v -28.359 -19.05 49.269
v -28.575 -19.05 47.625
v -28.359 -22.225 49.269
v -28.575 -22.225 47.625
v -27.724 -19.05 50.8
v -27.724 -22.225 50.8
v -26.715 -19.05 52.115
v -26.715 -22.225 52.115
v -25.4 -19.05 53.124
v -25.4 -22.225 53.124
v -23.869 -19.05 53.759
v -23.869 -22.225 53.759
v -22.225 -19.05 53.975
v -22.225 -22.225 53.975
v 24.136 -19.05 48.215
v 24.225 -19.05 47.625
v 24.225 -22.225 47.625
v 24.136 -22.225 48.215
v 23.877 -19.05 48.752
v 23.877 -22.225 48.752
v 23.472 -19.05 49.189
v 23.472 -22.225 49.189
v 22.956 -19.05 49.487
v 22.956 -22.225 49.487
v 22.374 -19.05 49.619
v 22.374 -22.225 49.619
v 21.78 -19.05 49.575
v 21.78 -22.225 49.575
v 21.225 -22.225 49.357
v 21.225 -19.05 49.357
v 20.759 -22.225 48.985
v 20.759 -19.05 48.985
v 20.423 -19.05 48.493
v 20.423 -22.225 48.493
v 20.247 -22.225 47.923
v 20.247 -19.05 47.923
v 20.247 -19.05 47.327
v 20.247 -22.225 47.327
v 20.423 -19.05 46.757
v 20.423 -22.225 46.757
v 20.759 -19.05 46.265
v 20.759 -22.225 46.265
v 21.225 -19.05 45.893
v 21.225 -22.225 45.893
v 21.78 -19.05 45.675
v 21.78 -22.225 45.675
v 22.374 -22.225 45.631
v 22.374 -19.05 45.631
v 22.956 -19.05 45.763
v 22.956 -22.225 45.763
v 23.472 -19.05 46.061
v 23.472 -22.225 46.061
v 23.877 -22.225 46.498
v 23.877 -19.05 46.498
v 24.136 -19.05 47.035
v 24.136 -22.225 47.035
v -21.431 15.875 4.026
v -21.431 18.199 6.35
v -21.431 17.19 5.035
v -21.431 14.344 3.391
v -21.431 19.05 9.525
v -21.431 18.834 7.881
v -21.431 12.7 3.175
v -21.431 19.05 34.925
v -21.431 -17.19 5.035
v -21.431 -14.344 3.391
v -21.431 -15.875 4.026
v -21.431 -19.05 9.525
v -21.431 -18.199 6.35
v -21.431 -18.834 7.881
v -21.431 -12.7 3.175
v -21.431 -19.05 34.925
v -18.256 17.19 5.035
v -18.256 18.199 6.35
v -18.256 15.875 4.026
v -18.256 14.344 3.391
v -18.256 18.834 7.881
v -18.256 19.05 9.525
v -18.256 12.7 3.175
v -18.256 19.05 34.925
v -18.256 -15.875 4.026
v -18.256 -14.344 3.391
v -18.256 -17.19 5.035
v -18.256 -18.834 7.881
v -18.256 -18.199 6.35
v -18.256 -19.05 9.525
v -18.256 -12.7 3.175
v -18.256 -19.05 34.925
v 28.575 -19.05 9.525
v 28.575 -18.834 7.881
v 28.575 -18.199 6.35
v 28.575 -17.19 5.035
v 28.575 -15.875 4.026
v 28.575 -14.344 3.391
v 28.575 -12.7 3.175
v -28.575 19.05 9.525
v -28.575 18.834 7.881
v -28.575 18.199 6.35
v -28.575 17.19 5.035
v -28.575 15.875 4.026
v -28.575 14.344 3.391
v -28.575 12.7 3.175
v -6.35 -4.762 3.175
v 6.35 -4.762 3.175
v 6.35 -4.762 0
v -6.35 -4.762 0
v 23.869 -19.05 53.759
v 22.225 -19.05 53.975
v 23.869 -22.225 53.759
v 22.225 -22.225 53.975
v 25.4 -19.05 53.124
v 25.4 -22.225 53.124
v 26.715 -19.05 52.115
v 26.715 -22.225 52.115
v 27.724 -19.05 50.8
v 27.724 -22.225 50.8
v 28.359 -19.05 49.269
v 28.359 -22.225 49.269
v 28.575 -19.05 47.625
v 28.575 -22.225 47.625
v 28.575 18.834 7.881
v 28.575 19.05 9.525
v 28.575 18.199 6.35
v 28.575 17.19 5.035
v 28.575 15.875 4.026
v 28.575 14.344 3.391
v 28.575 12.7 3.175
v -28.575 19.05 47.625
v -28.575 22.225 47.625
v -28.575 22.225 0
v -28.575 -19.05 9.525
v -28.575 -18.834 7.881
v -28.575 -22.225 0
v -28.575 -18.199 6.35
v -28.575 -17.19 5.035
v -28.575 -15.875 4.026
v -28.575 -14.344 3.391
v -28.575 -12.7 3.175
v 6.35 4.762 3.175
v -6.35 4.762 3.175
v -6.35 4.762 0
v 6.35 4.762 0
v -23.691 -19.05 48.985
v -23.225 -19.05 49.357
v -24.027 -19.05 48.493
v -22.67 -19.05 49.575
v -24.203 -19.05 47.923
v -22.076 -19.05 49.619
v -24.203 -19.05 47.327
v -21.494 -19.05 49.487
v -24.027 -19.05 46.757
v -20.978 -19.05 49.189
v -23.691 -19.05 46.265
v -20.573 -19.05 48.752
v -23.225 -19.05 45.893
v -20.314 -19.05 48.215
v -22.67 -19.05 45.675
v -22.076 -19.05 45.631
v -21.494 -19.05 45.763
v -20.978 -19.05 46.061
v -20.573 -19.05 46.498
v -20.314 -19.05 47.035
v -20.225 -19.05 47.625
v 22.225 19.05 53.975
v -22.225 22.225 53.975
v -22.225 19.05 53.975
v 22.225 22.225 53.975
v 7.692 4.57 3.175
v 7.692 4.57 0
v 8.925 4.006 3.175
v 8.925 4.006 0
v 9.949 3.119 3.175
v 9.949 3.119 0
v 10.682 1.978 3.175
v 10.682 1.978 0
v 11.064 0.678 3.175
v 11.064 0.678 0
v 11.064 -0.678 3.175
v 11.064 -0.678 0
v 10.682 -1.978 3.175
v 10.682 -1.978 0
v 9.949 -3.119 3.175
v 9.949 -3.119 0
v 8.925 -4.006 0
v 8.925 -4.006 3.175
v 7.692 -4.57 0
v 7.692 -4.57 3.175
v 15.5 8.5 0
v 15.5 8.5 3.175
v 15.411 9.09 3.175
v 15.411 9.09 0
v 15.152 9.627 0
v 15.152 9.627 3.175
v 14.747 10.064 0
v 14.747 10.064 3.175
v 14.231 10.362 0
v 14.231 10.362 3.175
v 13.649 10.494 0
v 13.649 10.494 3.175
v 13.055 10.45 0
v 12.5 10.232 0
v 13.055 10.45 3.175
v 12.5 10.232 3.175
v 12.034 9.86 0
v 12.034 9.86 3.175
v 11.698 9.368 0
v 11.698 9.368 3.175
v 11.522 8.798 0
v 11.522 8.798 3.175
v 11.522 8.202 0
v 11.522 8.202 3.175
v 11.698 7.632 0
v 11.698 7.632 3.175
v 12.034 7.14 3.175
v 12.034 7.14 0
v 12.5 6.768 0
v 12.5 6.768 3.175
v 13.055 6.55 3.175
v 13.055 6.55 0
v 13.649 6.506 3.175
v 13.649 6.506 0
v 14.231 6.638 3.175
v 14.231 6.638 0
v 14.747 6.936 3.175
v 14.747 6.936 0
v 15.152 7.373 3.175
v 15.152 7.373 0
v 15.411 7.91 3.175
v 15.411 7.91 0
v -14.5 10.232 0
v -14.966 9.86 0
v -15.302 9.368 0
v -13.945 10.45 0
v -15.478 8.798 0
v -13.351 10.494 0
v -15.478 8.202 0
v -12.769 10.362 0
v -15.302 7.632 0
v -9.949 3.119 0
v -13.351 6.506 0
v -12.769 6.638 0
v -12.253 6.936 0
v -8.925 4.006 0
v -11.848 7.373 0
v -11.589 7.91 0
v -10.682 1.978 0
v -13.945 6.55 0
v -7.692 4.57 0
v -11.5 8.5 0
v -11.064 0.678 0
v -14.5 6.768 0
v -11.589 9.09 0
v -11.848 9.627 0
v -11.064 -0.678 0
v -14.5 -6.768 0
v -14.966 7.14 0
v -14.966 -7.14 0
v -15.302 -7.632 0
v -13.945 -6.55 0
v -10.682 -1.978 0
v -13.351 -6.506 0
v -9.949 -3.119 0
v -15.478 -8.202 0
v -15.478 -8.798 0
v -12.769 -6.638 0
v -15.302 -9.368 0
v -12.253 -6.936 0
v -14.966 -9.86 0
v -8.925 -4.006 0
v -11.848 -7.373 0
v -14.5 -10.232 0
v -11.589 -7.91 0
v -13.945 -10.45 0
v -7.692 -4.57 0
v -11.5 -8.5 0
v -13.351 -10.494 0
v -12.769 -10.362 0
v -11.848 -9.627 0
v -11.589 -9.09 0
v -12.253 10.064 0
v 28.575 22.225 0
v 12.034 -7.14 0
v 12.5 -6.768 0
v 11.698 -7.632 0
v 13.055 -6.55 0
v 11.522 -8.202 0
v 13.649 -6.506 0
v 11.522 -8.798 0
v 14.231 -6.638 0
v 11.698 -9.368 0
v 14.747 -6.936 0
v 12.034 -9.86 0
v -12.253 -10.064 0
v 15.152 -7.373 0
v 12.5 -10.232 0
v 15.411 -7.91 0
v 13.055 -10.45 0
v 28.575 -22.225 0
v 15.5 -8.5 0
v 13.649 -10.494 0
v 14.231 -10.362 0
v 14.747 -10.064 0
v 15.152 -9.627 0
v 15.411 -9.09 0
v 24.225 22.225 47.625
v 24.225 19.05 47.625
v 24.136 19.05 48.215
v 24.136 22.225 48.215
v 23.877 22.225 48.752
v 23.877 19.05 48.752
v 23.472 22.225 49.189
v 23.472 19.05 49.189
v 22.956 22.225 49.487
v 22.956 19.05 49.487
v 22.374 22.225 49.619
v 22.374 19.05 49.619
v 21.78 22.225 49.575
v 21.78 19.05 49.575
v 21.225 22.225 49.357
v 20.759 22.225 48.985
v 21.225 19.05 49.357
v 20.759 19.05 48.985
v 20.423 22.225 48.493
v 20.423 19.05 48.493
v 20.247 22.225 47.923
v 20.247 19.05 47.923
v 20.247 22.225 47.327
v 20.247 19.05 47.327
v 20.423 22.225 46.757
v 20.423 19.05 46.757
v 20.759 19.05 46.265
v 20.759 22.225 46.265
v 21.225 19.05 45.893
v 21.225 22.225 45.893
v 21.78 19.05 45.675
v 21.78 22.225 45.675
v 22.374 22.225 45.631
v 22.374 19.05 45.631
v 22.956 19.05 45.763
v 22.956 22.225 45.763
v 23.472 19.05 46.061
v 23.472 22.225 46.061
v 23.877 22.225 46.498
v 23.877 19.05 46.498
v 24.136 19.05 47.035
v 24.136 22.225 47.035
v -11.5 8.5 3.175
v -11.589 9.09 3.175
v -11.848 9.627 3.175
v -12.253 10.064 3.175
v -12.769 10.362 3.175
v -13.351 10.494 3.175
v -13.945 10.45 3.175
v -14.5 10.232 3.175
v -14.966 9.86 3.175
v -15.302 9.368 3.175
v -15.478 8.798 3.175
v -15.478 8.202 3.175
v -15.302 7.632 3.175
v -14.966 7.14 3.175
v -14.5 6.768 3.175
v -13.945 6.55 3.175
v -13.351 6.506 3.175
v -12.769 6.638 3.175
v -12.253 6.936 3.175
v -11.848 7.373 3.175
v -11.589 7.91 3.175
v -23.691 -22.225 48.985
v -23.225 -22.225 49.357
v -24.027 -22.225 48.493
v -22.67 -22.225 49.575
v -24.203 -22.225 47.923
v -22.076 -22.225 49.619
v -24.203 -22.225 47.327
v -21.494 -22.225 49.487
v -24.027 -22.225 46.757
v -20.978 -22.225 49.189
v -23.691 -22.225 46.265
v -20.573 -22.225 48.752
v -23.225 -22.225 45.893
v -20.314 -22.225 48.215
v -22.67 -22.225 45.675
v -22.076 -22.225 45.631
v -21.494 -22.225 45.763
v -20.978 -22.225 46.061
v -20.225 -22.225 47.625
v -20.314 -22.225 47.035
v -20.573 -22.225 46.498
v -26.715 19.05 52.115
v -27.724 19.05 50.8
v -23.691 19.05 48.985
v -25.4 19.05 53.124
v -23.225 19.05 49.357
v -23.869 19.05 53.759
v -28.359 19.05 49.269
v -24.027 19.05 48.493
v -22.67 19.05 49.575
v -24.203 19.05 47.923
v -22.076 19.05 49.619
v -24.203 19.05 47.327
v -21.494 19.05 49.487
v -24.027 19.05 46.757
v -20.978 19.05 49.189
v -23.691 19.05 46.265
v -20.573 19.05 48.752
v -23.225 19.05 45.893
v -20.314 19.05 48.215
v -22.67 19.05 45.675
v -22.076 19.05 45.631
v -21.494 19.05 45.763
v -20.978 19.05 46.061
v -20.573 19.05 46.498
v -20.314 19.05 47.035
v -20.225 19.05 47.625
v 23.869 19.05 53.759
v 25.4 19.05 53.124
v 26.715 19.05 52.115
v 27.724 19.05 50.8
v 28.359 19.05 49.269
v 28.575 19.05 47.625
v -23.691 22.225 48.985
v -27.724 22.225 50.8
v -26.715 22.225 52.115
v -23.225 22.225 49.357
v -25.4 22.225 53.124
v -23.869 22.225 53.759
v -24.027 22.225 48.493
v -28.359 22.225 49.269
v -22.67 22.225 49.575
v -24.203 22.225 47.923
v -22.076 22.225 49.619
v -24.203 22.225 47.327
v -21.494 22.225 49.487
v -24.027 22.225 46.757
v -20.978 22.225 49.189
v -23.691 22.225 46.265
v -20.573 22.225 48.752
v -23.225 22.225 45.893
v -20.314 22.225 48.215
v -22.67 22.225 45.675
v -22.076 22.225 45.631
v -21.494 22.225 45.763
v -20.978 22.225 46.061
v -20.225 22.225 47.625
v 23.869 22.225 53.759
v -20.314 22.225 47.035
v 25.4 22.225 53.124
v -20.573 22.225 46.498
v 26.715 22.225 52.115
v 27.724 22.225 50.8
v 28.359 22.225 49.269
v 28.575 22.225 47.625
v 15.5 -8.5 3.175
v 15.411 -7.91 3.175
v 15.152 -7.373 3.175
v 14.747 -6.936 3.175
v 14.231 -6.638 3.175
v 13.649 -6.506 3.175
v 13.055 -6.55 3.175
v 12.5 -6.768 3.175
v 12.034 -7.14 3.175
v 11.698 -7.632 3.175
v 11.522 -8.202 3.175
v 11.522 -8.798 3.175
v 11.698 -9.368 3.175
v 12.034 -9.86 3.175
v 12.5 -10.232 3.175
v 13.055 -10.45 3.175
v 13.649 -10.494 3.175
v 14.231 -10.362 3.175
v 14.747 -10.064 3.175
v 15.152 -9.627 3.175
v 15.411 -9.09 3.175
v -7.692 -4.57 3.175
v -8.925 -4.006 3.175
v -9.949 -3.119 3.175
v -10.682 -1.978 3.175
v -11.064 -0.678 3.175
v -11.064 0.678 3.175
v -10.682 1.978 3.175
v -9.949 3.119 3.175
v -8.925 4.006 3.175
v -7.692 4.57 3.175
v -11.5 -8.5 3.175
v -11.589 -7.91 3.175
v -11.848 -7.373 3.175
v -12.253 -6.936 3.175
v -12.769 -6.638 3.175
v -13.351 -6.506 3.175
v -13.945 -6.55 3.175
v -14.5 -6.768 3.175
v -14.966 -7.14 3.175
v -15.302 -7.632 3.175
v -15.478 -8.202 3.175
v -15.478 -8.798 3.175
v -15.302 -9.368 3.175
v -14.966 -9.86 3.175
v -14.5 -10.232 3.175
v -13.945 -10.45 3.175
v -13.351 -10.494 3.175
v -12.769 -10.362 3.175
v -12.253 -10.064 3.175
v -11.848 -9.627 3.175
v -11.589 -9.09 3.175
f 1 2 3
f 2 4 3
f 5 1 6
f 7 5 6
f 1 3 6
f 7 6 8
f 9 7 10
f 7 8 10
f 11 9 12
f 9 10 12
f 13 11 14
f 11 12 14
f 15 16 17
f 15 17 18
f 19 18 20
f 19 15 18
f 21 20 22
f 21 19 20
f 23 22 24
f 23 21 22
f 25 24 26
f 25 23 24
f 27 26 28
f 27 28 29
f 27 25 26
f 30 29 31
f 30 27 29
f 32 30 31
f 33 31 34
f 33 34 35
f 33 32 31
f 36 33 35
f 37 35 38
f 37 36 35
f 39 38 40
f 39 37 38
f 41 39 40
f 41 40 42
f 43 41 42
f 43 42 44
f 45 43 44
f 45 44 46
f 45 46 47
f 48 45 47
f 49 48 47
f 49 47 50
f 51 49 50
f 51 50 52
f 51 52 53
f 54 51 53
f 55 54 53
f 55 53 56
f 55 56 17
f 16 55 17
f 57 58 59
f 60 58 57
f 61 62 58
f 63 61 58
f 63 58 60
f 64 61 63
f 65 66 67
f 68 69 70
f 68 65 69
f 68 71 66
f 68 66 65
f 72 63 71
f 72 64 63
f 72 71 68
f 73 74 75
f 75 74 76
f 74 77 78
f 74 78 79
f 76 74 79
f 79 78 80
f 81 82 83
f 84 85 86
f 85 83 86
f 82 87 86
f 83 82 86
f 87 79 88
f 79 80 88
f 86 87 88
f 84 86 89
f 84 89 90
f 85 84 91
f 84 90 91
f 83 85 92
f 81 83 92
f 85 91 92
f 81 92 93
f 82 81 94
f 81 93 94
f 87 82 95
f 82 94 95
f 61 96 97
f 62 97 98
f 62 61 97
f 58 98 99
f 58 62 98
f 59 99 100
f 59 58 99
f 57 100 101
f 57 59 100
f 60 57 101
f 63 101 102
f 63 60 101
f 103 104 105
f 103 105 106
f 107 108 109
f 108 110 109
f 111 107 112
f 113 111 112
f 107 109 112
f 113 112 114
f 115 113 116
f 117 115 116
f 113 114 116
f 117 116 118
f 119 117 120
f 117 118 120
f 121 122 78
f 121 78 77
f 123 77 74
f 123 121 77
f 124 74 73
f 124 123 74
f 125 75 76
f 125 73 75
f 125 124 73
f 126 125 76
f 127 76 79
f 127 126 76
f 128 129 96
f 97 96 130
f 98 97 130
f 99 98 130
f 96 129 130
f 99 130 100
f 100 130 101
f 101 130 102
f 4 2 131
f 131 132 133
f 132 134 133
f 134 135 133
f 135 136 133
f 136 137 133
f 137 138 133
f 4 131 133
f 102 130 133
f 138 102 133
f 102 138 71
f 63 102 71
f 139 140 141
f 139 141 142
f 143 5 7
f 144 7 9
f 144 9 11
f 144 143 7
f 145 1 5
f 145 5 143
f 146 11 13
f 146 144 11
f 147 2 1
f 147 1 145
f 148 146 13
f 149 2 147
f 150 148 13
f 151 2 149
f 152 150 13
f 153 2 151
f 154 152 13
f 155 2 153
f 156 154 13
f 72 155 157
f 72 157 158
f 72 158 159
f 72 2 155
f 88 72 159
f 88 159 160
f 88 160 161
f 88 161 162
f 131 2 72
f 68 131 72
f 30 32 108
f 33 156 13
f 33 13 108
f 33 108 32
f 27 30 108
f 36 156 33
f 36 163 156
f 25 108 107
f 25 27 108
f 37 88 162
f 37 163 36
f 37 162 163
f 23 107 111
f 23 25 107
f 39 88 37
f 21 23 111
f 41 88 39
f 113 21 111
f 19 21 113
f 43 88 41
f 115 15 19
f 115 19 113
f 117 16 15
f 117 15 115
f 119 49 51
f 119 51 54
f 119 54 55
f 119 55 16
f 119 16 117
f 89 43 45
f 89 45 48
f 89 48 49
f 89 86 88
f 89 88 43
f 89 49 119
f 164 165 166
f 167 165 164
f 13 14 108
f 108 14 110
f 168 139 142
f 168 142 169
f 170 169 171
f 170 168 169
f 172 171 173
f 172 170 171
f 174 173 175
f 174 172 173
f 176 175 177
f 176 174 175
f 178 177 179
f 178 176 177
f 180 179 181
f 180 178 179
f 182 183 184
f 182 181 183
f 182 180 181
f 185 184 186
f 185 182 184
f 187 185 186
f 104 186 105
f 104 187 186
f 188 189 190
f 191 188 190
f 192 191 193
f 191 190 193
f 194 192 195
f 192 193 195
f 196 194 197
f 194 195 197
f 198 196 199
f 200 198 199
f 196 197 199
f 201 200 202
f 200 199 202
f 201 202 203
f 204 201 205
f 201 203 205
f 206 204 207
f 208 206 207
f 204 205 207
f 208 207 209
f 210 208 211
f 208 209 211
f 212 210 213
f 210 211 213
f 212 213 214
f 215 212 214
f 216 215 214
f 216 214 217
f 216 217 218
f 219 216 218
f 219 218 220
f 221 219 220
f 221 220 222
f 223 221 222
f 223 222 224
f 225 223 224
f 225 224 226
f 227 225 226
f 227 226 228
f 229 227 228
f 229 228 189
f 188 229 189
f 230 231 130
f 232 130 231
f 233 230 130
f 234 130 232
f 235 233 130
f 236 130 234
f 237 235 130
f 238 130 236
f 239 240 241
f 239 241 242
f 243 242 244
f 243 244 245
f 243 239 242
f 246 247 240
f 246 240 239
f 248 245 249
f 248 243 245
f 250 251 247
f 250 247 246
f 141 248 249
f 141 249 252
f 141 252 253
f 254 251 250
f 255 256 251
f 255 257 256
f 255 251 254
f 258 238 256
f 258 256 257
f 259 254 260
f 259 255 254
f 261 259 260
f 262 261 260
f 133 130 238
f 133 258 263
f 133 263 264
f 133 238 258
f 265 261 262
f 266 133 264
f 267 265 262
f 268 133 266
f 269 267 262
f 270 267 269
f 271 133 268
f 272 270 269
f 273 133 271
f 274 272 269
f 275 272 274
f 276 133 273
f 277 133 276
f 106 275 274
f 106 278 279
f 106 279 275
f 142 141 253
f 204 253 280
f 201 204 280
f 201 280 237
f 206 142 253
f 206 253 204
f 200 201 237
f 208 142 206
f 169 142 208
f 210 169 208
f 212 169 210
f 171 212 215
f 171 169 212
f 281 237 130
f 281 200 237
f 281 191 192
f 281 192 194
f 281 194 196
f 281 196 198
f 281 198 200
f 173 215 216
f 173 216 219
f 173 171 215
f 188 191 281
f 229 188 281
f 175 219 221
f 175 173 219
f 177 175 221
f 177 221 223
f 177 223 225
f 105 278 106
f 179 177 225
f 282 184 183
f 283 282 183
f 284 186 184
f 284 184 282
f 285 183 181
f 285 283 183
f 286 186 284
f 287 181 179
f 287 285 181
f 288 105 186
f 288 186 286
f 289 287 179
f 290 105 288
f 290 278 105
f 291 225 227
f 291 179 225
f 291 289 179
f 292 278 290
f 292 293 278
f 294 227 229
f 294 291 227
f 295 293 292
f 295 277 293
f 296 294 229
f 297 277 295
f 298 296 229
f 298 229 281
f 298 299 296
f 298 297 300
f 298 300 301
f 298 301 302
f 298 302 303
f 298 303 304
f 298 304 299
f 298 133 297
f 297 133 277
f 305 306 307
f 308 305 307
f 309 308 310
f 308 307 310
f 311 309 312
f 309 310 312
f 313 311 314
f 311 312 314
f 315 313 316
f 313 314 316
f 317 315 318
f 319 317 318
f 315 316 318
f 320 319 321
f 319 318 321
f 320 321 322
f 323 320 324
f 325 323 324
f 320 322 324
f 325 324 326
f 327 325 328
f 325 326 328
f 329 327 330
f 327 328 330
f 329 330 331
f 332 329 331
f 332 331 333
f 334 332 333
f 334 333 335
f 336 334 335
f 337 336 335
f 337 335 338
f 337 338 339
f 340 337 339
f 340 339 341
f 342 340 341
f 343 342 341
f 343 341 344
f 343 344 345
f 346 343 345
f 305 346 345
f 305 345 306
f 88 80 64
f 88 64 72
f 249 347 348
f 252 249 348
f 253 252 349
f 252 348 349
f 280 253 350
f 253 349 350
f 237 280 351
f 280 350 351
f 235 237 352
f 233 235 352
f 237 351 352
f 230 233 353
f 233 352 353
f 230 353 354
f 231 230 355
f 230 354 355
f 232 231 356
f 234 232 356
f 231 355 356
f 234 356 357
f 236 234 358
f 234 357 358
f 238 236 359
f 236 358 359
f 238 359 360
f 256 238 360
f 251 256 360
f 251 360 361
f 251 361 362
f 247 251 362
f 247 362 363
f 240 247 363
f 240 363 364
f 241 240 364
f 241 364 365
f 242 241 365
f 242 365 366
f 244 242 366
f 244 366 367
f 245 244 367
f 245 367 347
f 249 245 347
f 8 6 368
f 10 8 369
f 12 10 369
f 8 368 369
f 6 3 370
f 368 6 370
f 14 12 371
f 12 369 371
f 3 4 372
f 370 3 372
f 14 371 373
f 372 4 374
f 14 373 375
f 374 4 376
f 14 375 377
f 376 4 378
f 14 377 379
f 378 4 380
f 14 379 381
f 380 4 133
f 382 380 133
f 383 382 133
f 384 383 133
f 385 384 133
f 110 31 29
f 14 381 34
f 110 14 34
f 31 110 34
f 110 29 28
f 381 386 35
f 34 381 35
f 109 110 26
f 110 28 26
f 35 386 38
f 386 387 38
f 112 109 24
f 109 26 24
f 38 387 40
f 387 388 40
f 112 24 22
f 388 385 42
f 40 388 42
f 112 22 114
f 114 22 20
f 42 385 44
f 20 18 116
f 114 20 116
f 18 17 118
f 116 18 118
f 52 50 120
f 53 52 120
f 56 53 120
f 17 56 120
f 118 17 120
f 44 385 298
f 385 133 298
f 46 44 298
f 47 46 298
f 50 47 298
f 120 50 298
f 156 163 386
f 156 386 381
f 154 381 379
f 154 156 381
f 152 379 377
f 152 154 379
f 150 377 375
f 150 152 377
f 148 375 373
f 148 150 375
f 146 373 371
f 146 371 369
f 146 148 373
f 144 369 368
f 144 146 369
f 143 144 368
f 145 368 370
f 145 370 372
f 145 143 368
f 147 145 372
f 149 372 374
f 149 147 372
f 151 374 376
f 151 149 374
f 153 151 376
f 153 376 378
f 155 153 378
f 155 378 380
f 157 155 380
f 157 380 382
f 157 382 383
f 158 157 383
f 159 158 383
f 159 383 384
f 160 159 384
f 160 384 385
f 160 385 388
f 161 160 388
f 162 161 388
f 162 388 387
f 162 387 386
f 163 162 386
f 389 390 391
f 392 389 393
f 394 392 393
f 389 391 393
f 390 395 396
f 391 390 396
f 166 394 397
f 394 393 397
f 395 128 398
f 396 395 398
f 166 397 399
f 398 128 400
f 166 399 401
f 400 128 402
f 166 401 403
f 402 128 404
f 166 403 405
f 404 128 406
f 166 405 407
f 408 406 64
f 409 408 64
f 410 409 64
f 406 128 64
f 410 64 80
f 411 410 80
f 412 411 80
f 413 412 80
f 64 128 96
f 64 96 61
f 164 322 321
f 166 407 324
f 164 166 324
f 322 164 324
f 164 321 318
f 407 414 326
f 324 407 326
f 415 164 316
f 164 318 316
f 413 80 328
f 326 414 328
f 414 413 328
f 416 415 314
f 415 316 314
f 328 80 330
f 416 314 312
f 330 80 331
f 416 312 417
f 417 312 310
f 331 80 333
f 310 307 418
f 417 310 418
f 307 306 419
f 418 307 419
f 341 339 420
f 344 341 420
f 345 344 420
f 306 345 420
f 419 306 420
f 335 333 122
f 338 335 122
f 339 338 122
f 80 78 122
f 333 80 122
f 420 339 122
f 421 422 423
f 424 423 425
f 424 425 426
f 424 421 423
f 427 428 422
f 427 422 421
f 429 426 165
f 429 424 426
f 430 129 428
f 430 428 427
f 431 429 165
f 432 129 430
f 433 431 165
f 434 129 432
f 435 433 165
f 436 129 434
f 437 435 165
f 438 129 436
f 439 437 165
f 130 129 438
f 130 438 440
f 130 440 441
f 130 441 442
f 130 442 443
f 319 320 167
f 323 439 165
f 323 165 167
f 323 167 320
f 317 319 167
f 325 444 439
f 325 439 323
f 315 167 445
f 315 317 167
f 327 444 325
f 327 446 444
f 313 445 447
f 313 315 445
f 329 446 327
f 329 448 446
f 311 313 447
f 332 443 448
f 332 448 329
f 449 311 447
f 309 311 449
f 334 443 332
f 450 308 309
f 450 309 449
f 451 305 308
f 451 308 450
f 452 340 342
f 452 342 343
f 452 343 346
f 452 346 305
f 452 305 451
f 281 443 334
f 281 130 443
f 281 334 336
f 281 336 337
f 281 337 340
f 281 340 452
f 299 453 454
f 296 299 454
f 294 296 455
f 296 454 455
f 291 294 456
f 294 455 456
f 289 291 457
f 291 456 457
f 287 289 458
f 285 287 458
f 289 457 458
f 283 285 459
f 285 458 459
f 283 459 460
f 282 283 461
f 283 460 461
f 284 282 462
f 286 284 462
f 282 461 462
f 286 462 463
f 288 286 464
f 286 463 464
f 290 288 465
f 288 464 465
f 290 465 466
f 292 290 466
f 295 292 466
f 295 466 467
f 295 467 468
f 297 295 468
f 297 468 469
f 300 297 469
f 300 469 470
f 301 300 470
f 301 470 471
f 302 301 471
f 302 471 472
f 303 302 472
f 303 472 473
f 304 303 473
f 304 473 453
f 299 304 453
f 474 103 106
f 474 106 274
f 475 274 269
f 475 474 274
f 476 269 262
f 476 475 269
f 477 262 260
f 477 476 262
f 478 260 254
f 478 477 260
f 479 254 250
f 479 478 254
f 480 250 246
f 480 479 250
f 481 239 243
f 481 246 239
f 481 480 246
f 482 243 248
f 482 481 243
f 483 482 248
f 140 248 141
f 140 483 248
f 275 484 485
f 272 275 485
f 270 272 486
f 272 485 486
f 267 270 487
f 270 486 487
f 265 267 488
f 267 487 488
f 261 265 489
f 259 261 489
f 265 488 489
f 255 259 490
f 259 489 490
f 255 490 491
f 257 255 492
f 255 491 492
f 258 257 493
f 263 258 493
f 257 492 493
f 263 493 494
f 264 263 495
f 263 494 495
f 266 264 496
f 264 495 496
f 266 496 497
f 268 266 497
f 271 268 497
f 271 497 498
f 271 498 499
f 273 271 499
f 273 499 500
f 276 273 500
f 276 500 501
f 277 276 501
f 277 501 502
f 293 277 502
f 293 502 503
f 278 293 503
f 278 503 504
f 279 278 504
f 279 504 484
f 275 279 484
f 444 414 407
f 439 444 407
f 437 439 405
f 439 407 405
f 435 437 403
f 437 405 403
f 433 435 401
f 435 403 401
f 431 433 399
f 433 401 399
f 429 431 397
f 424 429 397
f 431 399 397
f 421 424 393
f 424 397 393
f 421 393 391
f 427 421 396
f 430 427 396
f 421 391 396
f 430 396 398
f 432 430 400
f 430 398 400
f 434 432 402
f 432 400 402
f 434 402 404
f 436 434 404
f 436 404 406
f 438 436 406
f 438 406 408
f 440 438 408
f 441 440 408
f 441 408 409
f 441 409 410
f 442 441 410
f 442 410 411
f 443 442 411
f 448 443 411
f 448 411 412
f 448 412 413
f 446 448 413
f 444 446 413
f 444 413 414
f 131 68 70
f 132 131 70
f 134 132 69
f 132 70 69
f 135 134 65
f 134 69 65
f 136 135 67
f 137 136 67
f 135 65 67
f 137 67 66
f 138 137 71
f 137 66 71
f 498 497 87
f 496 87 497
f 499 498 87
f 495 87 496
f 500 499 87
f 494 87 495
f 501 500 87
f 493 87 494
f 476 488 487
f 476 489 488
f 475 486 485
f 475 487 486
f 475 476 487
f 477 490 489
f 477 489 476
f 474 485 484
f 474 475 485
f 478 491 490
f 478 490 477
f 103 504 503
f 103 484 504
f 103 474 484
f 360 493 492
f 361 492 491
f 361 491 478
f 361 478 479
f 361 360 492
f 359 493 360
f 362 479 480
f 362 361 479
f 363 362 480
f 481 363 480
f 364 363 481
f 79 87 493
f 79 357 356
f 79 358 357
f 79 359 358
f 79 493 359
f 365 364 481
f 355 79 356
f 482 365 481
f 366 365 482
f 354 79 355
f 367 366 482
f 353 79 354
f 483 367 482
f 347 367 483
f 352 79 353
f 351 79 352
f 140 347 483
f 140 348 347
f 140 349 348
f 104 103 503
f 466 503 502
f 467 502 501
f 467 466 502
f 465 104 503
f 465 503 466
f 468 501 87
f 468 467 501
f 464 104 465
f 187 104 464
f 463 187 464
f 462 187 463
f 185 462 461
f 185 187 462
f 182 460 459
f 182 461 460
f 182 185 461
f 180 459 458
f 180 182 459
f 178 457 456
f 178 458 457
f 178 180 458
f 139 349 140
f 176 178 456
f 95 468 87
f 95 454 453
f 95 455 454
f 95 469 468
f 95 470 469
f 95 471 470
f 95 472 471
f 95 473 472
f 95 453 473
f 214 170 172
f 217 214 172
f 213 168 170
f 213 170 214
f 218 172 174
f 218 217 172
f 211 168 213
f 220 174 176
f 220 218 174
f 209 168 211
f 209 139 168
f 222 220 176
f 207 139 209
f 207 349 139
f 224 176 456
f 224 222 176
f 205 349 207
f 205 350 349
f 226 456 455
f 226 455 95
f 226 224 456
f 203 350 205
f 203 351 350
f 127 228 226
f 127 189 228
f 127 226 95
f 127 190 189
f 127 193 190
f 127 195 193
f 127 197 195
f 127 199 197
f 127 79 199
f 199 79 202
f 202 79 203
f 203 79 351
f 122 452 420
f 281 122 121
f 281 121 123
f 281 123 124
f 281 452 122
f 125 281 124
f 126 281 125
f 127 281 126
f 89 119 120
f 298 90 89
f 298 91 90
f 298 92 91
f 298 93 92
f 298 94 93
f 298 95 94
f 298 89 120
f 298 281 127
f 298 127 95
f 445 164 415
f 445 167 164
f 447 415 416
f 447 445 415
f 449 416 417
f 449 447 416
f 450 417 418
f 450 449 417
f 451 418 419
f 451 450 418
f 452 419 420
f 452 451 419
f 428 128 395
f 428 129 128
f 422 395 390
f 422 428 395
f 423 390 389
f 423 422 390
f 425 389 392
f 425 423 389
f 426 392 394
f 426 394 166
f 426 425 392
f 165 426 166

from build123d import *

# Parameters (mm, degrees)
SKETCH1_W            = 57.15
SKETCH1_H            = 38.1
BOSS_EXTRUDE1_DEPTH  = 3.175
SKETCH2_R            = 2
CUT_EXTRUDE1_DEPTH   = 35.48932806
BOSS_EXTRUDE2_START  = -3.175
SKETCH3_W            = 57.15
SKETCH3_H            = 3.175
BOSS_EXTRUDE2_DEPTH  = 53.975
CUT_EXTRUDE2_REACH   = 73.982
SKETCH5_R            = 2
FILLET1_R            = 6.35
FILLET1_OF_MIRROR1_R = 6.35
RIB1_REACH           = 77.839
SKETCH7_WALL_W       = 191.77895835
SKETCH7_WALL_H       = 3.175


with BuildPart() as part:
    # Sketch1 → Boss-Extrude1 (new body)
    with BuildSketch(Plane.XY):
        Rectangle(SKETCH1_W, SKETCH1_H)
    extrude(amount=BOSS_EXTRUDE1_DEPTH)

    # Sketch2 → Cut-Extrude1 (cut, through all)
    with BuildSketch(Plane.XY.offset(3.175)):
        with Locations((-13.5, 8.5)):
            Circle(SKETCH2_R)
        with Locations((13.5, 8.5)):
            Circle(SKETCH2_R)
        with Locations((13.5, -8.5)):
            Circle(SKETCH2_R)
        with Locations((-13.5, -8.5)):
            Circle(SKETCH2_R)
        with BuildLine():
            Line((-6.35, 4.7625), (6.35, 4.7625))
            ThreePointArc((6.35, 4.7625), (11.1125, 0), (6.35, -4.7625))
            Line((6.35, -4.7625), (-6.35, -4.7625))
            ThreePointArc((-6.35, -4.7625), (-11.1125, 0), (-6.35, 4.7625))
        make_face()
    extrude(amount=-CUT_EXTRUDE1_DEPTH, mode=Mode.SUBTRACT)

    # Sketch3 → Boss-Extrude2 (add)
    with BuildSketch(Plane.XY.offset(3.175).offset(BOSS_EXTRUDE2_START)):
        with Locations((0, 20.6375)):
            Rectangle(SKETCH3_W, SKETCH3_H)
    boss_extrude2 = extrude(amount=BOSS_EXTRUDE2_DEPTH)

    # Sketch5 → Cut-Extrude2 (cut, up to next)
    with BuildSketch(Plane.XZ.offset(-19.05), mode=Mode.PRIVATE) as cut_extrude2_sk1:
        with Locations((-22.225, 47.625)):
            Circle(SKETCH5_R)
    cut_extrude2_tool1 = extrude(cut_extrude2_sk1.sketch, amount=-CUT_EXTRUDE2_REACH, mode=Mode.PRIVATE) & part.part
    # Sketch5 → Cut-Extrude2 (cut, up to next)
    with BuildSketch(Plane.XZ.offset(-19.05), mode=Mode.PRIVATE) as cut_extrude2_sk2:
        with Locations((22.225, 47.625)):
            Circle(SKETCH5_R)
    cut_extrude2_tool2 = extrude(cut_extrude2_sk2.sketch, amount=-CUT_EXTRUDE2_REACH, mode=Mode.PRIVATE) & part.part
    cut_extrude2_1 = cut_extrude2_tool1.solids().sort_by_distance((-22.225, 19.05, 47.625))[0]
    add(cut_extrude2_1, mode=Mode.SUBTRACT)
    cut_extrude2_2 = cut_extrude2_tool2.solids().sort_by_distance((22.225, 19.05, 47.625))[0]
    add(cut_extrude2_2, mode=Mode.SUBTRACT)
    cut_extrude2 = cut_extrude2_1 + cut_extrude2_2  # Cut-Extrude2 as one shape, for the pattern or mirror that repeats it

    # Fillet1
    fillet1_edges = [part.edges().sort_by_distance(p)[0] for p in [
        (28.575, 20.6375, 53.975),
        (-28.575, 20.6375, 53.975),
        (0, 19.05, 3.175),
    ]]
    fillet(fillet1_edges, radius=FILLET1_R)

    # Mirror1: Boss-Extrude2, Cut-Extrude2 across plane
    add(boss_extrude2.mirror(Plane.ZX))
    add(cut_extrude2.mirror(Plane.ZX), mode=Mode.SUBTRACT)

    # Fillet1 of Mirror1
    fillet1_of_mirror1_edges = [part.edges().sort_by_distance(p)[0] for p in [
        (28.575, -20.6375, 53.975),
        (-28.575, -20.6375, 53.975),
        (0, -19.05, 3.175),
    ]]
    fillet(fillet1_of_mirror1_edges, radius=FILLET1_OF_MIRROR1_R)

    # Sketch7 wall → Rib1 (add, up to next)
    with BuildSketch(Plane(origin=(-19.84375, 0, 34.925), x_dir=(0, -1, 0), z_dir=(0, 0, 1)), mode=Mode.PRIVATE) as rib1_sk1:
        Rectangle(SKETCH7_WALL_W, SKETCH7_WALL_H)
    rib1_tool1 = extrude(rib1_sk1.sketch, amount=-RIB1_REACH, mode=Mode.PRIVATE) - part.part
    add(rib1_tool1.solids().sort_by_distance((-19.84375, 0, 34.925))[0])


solid = part.part
